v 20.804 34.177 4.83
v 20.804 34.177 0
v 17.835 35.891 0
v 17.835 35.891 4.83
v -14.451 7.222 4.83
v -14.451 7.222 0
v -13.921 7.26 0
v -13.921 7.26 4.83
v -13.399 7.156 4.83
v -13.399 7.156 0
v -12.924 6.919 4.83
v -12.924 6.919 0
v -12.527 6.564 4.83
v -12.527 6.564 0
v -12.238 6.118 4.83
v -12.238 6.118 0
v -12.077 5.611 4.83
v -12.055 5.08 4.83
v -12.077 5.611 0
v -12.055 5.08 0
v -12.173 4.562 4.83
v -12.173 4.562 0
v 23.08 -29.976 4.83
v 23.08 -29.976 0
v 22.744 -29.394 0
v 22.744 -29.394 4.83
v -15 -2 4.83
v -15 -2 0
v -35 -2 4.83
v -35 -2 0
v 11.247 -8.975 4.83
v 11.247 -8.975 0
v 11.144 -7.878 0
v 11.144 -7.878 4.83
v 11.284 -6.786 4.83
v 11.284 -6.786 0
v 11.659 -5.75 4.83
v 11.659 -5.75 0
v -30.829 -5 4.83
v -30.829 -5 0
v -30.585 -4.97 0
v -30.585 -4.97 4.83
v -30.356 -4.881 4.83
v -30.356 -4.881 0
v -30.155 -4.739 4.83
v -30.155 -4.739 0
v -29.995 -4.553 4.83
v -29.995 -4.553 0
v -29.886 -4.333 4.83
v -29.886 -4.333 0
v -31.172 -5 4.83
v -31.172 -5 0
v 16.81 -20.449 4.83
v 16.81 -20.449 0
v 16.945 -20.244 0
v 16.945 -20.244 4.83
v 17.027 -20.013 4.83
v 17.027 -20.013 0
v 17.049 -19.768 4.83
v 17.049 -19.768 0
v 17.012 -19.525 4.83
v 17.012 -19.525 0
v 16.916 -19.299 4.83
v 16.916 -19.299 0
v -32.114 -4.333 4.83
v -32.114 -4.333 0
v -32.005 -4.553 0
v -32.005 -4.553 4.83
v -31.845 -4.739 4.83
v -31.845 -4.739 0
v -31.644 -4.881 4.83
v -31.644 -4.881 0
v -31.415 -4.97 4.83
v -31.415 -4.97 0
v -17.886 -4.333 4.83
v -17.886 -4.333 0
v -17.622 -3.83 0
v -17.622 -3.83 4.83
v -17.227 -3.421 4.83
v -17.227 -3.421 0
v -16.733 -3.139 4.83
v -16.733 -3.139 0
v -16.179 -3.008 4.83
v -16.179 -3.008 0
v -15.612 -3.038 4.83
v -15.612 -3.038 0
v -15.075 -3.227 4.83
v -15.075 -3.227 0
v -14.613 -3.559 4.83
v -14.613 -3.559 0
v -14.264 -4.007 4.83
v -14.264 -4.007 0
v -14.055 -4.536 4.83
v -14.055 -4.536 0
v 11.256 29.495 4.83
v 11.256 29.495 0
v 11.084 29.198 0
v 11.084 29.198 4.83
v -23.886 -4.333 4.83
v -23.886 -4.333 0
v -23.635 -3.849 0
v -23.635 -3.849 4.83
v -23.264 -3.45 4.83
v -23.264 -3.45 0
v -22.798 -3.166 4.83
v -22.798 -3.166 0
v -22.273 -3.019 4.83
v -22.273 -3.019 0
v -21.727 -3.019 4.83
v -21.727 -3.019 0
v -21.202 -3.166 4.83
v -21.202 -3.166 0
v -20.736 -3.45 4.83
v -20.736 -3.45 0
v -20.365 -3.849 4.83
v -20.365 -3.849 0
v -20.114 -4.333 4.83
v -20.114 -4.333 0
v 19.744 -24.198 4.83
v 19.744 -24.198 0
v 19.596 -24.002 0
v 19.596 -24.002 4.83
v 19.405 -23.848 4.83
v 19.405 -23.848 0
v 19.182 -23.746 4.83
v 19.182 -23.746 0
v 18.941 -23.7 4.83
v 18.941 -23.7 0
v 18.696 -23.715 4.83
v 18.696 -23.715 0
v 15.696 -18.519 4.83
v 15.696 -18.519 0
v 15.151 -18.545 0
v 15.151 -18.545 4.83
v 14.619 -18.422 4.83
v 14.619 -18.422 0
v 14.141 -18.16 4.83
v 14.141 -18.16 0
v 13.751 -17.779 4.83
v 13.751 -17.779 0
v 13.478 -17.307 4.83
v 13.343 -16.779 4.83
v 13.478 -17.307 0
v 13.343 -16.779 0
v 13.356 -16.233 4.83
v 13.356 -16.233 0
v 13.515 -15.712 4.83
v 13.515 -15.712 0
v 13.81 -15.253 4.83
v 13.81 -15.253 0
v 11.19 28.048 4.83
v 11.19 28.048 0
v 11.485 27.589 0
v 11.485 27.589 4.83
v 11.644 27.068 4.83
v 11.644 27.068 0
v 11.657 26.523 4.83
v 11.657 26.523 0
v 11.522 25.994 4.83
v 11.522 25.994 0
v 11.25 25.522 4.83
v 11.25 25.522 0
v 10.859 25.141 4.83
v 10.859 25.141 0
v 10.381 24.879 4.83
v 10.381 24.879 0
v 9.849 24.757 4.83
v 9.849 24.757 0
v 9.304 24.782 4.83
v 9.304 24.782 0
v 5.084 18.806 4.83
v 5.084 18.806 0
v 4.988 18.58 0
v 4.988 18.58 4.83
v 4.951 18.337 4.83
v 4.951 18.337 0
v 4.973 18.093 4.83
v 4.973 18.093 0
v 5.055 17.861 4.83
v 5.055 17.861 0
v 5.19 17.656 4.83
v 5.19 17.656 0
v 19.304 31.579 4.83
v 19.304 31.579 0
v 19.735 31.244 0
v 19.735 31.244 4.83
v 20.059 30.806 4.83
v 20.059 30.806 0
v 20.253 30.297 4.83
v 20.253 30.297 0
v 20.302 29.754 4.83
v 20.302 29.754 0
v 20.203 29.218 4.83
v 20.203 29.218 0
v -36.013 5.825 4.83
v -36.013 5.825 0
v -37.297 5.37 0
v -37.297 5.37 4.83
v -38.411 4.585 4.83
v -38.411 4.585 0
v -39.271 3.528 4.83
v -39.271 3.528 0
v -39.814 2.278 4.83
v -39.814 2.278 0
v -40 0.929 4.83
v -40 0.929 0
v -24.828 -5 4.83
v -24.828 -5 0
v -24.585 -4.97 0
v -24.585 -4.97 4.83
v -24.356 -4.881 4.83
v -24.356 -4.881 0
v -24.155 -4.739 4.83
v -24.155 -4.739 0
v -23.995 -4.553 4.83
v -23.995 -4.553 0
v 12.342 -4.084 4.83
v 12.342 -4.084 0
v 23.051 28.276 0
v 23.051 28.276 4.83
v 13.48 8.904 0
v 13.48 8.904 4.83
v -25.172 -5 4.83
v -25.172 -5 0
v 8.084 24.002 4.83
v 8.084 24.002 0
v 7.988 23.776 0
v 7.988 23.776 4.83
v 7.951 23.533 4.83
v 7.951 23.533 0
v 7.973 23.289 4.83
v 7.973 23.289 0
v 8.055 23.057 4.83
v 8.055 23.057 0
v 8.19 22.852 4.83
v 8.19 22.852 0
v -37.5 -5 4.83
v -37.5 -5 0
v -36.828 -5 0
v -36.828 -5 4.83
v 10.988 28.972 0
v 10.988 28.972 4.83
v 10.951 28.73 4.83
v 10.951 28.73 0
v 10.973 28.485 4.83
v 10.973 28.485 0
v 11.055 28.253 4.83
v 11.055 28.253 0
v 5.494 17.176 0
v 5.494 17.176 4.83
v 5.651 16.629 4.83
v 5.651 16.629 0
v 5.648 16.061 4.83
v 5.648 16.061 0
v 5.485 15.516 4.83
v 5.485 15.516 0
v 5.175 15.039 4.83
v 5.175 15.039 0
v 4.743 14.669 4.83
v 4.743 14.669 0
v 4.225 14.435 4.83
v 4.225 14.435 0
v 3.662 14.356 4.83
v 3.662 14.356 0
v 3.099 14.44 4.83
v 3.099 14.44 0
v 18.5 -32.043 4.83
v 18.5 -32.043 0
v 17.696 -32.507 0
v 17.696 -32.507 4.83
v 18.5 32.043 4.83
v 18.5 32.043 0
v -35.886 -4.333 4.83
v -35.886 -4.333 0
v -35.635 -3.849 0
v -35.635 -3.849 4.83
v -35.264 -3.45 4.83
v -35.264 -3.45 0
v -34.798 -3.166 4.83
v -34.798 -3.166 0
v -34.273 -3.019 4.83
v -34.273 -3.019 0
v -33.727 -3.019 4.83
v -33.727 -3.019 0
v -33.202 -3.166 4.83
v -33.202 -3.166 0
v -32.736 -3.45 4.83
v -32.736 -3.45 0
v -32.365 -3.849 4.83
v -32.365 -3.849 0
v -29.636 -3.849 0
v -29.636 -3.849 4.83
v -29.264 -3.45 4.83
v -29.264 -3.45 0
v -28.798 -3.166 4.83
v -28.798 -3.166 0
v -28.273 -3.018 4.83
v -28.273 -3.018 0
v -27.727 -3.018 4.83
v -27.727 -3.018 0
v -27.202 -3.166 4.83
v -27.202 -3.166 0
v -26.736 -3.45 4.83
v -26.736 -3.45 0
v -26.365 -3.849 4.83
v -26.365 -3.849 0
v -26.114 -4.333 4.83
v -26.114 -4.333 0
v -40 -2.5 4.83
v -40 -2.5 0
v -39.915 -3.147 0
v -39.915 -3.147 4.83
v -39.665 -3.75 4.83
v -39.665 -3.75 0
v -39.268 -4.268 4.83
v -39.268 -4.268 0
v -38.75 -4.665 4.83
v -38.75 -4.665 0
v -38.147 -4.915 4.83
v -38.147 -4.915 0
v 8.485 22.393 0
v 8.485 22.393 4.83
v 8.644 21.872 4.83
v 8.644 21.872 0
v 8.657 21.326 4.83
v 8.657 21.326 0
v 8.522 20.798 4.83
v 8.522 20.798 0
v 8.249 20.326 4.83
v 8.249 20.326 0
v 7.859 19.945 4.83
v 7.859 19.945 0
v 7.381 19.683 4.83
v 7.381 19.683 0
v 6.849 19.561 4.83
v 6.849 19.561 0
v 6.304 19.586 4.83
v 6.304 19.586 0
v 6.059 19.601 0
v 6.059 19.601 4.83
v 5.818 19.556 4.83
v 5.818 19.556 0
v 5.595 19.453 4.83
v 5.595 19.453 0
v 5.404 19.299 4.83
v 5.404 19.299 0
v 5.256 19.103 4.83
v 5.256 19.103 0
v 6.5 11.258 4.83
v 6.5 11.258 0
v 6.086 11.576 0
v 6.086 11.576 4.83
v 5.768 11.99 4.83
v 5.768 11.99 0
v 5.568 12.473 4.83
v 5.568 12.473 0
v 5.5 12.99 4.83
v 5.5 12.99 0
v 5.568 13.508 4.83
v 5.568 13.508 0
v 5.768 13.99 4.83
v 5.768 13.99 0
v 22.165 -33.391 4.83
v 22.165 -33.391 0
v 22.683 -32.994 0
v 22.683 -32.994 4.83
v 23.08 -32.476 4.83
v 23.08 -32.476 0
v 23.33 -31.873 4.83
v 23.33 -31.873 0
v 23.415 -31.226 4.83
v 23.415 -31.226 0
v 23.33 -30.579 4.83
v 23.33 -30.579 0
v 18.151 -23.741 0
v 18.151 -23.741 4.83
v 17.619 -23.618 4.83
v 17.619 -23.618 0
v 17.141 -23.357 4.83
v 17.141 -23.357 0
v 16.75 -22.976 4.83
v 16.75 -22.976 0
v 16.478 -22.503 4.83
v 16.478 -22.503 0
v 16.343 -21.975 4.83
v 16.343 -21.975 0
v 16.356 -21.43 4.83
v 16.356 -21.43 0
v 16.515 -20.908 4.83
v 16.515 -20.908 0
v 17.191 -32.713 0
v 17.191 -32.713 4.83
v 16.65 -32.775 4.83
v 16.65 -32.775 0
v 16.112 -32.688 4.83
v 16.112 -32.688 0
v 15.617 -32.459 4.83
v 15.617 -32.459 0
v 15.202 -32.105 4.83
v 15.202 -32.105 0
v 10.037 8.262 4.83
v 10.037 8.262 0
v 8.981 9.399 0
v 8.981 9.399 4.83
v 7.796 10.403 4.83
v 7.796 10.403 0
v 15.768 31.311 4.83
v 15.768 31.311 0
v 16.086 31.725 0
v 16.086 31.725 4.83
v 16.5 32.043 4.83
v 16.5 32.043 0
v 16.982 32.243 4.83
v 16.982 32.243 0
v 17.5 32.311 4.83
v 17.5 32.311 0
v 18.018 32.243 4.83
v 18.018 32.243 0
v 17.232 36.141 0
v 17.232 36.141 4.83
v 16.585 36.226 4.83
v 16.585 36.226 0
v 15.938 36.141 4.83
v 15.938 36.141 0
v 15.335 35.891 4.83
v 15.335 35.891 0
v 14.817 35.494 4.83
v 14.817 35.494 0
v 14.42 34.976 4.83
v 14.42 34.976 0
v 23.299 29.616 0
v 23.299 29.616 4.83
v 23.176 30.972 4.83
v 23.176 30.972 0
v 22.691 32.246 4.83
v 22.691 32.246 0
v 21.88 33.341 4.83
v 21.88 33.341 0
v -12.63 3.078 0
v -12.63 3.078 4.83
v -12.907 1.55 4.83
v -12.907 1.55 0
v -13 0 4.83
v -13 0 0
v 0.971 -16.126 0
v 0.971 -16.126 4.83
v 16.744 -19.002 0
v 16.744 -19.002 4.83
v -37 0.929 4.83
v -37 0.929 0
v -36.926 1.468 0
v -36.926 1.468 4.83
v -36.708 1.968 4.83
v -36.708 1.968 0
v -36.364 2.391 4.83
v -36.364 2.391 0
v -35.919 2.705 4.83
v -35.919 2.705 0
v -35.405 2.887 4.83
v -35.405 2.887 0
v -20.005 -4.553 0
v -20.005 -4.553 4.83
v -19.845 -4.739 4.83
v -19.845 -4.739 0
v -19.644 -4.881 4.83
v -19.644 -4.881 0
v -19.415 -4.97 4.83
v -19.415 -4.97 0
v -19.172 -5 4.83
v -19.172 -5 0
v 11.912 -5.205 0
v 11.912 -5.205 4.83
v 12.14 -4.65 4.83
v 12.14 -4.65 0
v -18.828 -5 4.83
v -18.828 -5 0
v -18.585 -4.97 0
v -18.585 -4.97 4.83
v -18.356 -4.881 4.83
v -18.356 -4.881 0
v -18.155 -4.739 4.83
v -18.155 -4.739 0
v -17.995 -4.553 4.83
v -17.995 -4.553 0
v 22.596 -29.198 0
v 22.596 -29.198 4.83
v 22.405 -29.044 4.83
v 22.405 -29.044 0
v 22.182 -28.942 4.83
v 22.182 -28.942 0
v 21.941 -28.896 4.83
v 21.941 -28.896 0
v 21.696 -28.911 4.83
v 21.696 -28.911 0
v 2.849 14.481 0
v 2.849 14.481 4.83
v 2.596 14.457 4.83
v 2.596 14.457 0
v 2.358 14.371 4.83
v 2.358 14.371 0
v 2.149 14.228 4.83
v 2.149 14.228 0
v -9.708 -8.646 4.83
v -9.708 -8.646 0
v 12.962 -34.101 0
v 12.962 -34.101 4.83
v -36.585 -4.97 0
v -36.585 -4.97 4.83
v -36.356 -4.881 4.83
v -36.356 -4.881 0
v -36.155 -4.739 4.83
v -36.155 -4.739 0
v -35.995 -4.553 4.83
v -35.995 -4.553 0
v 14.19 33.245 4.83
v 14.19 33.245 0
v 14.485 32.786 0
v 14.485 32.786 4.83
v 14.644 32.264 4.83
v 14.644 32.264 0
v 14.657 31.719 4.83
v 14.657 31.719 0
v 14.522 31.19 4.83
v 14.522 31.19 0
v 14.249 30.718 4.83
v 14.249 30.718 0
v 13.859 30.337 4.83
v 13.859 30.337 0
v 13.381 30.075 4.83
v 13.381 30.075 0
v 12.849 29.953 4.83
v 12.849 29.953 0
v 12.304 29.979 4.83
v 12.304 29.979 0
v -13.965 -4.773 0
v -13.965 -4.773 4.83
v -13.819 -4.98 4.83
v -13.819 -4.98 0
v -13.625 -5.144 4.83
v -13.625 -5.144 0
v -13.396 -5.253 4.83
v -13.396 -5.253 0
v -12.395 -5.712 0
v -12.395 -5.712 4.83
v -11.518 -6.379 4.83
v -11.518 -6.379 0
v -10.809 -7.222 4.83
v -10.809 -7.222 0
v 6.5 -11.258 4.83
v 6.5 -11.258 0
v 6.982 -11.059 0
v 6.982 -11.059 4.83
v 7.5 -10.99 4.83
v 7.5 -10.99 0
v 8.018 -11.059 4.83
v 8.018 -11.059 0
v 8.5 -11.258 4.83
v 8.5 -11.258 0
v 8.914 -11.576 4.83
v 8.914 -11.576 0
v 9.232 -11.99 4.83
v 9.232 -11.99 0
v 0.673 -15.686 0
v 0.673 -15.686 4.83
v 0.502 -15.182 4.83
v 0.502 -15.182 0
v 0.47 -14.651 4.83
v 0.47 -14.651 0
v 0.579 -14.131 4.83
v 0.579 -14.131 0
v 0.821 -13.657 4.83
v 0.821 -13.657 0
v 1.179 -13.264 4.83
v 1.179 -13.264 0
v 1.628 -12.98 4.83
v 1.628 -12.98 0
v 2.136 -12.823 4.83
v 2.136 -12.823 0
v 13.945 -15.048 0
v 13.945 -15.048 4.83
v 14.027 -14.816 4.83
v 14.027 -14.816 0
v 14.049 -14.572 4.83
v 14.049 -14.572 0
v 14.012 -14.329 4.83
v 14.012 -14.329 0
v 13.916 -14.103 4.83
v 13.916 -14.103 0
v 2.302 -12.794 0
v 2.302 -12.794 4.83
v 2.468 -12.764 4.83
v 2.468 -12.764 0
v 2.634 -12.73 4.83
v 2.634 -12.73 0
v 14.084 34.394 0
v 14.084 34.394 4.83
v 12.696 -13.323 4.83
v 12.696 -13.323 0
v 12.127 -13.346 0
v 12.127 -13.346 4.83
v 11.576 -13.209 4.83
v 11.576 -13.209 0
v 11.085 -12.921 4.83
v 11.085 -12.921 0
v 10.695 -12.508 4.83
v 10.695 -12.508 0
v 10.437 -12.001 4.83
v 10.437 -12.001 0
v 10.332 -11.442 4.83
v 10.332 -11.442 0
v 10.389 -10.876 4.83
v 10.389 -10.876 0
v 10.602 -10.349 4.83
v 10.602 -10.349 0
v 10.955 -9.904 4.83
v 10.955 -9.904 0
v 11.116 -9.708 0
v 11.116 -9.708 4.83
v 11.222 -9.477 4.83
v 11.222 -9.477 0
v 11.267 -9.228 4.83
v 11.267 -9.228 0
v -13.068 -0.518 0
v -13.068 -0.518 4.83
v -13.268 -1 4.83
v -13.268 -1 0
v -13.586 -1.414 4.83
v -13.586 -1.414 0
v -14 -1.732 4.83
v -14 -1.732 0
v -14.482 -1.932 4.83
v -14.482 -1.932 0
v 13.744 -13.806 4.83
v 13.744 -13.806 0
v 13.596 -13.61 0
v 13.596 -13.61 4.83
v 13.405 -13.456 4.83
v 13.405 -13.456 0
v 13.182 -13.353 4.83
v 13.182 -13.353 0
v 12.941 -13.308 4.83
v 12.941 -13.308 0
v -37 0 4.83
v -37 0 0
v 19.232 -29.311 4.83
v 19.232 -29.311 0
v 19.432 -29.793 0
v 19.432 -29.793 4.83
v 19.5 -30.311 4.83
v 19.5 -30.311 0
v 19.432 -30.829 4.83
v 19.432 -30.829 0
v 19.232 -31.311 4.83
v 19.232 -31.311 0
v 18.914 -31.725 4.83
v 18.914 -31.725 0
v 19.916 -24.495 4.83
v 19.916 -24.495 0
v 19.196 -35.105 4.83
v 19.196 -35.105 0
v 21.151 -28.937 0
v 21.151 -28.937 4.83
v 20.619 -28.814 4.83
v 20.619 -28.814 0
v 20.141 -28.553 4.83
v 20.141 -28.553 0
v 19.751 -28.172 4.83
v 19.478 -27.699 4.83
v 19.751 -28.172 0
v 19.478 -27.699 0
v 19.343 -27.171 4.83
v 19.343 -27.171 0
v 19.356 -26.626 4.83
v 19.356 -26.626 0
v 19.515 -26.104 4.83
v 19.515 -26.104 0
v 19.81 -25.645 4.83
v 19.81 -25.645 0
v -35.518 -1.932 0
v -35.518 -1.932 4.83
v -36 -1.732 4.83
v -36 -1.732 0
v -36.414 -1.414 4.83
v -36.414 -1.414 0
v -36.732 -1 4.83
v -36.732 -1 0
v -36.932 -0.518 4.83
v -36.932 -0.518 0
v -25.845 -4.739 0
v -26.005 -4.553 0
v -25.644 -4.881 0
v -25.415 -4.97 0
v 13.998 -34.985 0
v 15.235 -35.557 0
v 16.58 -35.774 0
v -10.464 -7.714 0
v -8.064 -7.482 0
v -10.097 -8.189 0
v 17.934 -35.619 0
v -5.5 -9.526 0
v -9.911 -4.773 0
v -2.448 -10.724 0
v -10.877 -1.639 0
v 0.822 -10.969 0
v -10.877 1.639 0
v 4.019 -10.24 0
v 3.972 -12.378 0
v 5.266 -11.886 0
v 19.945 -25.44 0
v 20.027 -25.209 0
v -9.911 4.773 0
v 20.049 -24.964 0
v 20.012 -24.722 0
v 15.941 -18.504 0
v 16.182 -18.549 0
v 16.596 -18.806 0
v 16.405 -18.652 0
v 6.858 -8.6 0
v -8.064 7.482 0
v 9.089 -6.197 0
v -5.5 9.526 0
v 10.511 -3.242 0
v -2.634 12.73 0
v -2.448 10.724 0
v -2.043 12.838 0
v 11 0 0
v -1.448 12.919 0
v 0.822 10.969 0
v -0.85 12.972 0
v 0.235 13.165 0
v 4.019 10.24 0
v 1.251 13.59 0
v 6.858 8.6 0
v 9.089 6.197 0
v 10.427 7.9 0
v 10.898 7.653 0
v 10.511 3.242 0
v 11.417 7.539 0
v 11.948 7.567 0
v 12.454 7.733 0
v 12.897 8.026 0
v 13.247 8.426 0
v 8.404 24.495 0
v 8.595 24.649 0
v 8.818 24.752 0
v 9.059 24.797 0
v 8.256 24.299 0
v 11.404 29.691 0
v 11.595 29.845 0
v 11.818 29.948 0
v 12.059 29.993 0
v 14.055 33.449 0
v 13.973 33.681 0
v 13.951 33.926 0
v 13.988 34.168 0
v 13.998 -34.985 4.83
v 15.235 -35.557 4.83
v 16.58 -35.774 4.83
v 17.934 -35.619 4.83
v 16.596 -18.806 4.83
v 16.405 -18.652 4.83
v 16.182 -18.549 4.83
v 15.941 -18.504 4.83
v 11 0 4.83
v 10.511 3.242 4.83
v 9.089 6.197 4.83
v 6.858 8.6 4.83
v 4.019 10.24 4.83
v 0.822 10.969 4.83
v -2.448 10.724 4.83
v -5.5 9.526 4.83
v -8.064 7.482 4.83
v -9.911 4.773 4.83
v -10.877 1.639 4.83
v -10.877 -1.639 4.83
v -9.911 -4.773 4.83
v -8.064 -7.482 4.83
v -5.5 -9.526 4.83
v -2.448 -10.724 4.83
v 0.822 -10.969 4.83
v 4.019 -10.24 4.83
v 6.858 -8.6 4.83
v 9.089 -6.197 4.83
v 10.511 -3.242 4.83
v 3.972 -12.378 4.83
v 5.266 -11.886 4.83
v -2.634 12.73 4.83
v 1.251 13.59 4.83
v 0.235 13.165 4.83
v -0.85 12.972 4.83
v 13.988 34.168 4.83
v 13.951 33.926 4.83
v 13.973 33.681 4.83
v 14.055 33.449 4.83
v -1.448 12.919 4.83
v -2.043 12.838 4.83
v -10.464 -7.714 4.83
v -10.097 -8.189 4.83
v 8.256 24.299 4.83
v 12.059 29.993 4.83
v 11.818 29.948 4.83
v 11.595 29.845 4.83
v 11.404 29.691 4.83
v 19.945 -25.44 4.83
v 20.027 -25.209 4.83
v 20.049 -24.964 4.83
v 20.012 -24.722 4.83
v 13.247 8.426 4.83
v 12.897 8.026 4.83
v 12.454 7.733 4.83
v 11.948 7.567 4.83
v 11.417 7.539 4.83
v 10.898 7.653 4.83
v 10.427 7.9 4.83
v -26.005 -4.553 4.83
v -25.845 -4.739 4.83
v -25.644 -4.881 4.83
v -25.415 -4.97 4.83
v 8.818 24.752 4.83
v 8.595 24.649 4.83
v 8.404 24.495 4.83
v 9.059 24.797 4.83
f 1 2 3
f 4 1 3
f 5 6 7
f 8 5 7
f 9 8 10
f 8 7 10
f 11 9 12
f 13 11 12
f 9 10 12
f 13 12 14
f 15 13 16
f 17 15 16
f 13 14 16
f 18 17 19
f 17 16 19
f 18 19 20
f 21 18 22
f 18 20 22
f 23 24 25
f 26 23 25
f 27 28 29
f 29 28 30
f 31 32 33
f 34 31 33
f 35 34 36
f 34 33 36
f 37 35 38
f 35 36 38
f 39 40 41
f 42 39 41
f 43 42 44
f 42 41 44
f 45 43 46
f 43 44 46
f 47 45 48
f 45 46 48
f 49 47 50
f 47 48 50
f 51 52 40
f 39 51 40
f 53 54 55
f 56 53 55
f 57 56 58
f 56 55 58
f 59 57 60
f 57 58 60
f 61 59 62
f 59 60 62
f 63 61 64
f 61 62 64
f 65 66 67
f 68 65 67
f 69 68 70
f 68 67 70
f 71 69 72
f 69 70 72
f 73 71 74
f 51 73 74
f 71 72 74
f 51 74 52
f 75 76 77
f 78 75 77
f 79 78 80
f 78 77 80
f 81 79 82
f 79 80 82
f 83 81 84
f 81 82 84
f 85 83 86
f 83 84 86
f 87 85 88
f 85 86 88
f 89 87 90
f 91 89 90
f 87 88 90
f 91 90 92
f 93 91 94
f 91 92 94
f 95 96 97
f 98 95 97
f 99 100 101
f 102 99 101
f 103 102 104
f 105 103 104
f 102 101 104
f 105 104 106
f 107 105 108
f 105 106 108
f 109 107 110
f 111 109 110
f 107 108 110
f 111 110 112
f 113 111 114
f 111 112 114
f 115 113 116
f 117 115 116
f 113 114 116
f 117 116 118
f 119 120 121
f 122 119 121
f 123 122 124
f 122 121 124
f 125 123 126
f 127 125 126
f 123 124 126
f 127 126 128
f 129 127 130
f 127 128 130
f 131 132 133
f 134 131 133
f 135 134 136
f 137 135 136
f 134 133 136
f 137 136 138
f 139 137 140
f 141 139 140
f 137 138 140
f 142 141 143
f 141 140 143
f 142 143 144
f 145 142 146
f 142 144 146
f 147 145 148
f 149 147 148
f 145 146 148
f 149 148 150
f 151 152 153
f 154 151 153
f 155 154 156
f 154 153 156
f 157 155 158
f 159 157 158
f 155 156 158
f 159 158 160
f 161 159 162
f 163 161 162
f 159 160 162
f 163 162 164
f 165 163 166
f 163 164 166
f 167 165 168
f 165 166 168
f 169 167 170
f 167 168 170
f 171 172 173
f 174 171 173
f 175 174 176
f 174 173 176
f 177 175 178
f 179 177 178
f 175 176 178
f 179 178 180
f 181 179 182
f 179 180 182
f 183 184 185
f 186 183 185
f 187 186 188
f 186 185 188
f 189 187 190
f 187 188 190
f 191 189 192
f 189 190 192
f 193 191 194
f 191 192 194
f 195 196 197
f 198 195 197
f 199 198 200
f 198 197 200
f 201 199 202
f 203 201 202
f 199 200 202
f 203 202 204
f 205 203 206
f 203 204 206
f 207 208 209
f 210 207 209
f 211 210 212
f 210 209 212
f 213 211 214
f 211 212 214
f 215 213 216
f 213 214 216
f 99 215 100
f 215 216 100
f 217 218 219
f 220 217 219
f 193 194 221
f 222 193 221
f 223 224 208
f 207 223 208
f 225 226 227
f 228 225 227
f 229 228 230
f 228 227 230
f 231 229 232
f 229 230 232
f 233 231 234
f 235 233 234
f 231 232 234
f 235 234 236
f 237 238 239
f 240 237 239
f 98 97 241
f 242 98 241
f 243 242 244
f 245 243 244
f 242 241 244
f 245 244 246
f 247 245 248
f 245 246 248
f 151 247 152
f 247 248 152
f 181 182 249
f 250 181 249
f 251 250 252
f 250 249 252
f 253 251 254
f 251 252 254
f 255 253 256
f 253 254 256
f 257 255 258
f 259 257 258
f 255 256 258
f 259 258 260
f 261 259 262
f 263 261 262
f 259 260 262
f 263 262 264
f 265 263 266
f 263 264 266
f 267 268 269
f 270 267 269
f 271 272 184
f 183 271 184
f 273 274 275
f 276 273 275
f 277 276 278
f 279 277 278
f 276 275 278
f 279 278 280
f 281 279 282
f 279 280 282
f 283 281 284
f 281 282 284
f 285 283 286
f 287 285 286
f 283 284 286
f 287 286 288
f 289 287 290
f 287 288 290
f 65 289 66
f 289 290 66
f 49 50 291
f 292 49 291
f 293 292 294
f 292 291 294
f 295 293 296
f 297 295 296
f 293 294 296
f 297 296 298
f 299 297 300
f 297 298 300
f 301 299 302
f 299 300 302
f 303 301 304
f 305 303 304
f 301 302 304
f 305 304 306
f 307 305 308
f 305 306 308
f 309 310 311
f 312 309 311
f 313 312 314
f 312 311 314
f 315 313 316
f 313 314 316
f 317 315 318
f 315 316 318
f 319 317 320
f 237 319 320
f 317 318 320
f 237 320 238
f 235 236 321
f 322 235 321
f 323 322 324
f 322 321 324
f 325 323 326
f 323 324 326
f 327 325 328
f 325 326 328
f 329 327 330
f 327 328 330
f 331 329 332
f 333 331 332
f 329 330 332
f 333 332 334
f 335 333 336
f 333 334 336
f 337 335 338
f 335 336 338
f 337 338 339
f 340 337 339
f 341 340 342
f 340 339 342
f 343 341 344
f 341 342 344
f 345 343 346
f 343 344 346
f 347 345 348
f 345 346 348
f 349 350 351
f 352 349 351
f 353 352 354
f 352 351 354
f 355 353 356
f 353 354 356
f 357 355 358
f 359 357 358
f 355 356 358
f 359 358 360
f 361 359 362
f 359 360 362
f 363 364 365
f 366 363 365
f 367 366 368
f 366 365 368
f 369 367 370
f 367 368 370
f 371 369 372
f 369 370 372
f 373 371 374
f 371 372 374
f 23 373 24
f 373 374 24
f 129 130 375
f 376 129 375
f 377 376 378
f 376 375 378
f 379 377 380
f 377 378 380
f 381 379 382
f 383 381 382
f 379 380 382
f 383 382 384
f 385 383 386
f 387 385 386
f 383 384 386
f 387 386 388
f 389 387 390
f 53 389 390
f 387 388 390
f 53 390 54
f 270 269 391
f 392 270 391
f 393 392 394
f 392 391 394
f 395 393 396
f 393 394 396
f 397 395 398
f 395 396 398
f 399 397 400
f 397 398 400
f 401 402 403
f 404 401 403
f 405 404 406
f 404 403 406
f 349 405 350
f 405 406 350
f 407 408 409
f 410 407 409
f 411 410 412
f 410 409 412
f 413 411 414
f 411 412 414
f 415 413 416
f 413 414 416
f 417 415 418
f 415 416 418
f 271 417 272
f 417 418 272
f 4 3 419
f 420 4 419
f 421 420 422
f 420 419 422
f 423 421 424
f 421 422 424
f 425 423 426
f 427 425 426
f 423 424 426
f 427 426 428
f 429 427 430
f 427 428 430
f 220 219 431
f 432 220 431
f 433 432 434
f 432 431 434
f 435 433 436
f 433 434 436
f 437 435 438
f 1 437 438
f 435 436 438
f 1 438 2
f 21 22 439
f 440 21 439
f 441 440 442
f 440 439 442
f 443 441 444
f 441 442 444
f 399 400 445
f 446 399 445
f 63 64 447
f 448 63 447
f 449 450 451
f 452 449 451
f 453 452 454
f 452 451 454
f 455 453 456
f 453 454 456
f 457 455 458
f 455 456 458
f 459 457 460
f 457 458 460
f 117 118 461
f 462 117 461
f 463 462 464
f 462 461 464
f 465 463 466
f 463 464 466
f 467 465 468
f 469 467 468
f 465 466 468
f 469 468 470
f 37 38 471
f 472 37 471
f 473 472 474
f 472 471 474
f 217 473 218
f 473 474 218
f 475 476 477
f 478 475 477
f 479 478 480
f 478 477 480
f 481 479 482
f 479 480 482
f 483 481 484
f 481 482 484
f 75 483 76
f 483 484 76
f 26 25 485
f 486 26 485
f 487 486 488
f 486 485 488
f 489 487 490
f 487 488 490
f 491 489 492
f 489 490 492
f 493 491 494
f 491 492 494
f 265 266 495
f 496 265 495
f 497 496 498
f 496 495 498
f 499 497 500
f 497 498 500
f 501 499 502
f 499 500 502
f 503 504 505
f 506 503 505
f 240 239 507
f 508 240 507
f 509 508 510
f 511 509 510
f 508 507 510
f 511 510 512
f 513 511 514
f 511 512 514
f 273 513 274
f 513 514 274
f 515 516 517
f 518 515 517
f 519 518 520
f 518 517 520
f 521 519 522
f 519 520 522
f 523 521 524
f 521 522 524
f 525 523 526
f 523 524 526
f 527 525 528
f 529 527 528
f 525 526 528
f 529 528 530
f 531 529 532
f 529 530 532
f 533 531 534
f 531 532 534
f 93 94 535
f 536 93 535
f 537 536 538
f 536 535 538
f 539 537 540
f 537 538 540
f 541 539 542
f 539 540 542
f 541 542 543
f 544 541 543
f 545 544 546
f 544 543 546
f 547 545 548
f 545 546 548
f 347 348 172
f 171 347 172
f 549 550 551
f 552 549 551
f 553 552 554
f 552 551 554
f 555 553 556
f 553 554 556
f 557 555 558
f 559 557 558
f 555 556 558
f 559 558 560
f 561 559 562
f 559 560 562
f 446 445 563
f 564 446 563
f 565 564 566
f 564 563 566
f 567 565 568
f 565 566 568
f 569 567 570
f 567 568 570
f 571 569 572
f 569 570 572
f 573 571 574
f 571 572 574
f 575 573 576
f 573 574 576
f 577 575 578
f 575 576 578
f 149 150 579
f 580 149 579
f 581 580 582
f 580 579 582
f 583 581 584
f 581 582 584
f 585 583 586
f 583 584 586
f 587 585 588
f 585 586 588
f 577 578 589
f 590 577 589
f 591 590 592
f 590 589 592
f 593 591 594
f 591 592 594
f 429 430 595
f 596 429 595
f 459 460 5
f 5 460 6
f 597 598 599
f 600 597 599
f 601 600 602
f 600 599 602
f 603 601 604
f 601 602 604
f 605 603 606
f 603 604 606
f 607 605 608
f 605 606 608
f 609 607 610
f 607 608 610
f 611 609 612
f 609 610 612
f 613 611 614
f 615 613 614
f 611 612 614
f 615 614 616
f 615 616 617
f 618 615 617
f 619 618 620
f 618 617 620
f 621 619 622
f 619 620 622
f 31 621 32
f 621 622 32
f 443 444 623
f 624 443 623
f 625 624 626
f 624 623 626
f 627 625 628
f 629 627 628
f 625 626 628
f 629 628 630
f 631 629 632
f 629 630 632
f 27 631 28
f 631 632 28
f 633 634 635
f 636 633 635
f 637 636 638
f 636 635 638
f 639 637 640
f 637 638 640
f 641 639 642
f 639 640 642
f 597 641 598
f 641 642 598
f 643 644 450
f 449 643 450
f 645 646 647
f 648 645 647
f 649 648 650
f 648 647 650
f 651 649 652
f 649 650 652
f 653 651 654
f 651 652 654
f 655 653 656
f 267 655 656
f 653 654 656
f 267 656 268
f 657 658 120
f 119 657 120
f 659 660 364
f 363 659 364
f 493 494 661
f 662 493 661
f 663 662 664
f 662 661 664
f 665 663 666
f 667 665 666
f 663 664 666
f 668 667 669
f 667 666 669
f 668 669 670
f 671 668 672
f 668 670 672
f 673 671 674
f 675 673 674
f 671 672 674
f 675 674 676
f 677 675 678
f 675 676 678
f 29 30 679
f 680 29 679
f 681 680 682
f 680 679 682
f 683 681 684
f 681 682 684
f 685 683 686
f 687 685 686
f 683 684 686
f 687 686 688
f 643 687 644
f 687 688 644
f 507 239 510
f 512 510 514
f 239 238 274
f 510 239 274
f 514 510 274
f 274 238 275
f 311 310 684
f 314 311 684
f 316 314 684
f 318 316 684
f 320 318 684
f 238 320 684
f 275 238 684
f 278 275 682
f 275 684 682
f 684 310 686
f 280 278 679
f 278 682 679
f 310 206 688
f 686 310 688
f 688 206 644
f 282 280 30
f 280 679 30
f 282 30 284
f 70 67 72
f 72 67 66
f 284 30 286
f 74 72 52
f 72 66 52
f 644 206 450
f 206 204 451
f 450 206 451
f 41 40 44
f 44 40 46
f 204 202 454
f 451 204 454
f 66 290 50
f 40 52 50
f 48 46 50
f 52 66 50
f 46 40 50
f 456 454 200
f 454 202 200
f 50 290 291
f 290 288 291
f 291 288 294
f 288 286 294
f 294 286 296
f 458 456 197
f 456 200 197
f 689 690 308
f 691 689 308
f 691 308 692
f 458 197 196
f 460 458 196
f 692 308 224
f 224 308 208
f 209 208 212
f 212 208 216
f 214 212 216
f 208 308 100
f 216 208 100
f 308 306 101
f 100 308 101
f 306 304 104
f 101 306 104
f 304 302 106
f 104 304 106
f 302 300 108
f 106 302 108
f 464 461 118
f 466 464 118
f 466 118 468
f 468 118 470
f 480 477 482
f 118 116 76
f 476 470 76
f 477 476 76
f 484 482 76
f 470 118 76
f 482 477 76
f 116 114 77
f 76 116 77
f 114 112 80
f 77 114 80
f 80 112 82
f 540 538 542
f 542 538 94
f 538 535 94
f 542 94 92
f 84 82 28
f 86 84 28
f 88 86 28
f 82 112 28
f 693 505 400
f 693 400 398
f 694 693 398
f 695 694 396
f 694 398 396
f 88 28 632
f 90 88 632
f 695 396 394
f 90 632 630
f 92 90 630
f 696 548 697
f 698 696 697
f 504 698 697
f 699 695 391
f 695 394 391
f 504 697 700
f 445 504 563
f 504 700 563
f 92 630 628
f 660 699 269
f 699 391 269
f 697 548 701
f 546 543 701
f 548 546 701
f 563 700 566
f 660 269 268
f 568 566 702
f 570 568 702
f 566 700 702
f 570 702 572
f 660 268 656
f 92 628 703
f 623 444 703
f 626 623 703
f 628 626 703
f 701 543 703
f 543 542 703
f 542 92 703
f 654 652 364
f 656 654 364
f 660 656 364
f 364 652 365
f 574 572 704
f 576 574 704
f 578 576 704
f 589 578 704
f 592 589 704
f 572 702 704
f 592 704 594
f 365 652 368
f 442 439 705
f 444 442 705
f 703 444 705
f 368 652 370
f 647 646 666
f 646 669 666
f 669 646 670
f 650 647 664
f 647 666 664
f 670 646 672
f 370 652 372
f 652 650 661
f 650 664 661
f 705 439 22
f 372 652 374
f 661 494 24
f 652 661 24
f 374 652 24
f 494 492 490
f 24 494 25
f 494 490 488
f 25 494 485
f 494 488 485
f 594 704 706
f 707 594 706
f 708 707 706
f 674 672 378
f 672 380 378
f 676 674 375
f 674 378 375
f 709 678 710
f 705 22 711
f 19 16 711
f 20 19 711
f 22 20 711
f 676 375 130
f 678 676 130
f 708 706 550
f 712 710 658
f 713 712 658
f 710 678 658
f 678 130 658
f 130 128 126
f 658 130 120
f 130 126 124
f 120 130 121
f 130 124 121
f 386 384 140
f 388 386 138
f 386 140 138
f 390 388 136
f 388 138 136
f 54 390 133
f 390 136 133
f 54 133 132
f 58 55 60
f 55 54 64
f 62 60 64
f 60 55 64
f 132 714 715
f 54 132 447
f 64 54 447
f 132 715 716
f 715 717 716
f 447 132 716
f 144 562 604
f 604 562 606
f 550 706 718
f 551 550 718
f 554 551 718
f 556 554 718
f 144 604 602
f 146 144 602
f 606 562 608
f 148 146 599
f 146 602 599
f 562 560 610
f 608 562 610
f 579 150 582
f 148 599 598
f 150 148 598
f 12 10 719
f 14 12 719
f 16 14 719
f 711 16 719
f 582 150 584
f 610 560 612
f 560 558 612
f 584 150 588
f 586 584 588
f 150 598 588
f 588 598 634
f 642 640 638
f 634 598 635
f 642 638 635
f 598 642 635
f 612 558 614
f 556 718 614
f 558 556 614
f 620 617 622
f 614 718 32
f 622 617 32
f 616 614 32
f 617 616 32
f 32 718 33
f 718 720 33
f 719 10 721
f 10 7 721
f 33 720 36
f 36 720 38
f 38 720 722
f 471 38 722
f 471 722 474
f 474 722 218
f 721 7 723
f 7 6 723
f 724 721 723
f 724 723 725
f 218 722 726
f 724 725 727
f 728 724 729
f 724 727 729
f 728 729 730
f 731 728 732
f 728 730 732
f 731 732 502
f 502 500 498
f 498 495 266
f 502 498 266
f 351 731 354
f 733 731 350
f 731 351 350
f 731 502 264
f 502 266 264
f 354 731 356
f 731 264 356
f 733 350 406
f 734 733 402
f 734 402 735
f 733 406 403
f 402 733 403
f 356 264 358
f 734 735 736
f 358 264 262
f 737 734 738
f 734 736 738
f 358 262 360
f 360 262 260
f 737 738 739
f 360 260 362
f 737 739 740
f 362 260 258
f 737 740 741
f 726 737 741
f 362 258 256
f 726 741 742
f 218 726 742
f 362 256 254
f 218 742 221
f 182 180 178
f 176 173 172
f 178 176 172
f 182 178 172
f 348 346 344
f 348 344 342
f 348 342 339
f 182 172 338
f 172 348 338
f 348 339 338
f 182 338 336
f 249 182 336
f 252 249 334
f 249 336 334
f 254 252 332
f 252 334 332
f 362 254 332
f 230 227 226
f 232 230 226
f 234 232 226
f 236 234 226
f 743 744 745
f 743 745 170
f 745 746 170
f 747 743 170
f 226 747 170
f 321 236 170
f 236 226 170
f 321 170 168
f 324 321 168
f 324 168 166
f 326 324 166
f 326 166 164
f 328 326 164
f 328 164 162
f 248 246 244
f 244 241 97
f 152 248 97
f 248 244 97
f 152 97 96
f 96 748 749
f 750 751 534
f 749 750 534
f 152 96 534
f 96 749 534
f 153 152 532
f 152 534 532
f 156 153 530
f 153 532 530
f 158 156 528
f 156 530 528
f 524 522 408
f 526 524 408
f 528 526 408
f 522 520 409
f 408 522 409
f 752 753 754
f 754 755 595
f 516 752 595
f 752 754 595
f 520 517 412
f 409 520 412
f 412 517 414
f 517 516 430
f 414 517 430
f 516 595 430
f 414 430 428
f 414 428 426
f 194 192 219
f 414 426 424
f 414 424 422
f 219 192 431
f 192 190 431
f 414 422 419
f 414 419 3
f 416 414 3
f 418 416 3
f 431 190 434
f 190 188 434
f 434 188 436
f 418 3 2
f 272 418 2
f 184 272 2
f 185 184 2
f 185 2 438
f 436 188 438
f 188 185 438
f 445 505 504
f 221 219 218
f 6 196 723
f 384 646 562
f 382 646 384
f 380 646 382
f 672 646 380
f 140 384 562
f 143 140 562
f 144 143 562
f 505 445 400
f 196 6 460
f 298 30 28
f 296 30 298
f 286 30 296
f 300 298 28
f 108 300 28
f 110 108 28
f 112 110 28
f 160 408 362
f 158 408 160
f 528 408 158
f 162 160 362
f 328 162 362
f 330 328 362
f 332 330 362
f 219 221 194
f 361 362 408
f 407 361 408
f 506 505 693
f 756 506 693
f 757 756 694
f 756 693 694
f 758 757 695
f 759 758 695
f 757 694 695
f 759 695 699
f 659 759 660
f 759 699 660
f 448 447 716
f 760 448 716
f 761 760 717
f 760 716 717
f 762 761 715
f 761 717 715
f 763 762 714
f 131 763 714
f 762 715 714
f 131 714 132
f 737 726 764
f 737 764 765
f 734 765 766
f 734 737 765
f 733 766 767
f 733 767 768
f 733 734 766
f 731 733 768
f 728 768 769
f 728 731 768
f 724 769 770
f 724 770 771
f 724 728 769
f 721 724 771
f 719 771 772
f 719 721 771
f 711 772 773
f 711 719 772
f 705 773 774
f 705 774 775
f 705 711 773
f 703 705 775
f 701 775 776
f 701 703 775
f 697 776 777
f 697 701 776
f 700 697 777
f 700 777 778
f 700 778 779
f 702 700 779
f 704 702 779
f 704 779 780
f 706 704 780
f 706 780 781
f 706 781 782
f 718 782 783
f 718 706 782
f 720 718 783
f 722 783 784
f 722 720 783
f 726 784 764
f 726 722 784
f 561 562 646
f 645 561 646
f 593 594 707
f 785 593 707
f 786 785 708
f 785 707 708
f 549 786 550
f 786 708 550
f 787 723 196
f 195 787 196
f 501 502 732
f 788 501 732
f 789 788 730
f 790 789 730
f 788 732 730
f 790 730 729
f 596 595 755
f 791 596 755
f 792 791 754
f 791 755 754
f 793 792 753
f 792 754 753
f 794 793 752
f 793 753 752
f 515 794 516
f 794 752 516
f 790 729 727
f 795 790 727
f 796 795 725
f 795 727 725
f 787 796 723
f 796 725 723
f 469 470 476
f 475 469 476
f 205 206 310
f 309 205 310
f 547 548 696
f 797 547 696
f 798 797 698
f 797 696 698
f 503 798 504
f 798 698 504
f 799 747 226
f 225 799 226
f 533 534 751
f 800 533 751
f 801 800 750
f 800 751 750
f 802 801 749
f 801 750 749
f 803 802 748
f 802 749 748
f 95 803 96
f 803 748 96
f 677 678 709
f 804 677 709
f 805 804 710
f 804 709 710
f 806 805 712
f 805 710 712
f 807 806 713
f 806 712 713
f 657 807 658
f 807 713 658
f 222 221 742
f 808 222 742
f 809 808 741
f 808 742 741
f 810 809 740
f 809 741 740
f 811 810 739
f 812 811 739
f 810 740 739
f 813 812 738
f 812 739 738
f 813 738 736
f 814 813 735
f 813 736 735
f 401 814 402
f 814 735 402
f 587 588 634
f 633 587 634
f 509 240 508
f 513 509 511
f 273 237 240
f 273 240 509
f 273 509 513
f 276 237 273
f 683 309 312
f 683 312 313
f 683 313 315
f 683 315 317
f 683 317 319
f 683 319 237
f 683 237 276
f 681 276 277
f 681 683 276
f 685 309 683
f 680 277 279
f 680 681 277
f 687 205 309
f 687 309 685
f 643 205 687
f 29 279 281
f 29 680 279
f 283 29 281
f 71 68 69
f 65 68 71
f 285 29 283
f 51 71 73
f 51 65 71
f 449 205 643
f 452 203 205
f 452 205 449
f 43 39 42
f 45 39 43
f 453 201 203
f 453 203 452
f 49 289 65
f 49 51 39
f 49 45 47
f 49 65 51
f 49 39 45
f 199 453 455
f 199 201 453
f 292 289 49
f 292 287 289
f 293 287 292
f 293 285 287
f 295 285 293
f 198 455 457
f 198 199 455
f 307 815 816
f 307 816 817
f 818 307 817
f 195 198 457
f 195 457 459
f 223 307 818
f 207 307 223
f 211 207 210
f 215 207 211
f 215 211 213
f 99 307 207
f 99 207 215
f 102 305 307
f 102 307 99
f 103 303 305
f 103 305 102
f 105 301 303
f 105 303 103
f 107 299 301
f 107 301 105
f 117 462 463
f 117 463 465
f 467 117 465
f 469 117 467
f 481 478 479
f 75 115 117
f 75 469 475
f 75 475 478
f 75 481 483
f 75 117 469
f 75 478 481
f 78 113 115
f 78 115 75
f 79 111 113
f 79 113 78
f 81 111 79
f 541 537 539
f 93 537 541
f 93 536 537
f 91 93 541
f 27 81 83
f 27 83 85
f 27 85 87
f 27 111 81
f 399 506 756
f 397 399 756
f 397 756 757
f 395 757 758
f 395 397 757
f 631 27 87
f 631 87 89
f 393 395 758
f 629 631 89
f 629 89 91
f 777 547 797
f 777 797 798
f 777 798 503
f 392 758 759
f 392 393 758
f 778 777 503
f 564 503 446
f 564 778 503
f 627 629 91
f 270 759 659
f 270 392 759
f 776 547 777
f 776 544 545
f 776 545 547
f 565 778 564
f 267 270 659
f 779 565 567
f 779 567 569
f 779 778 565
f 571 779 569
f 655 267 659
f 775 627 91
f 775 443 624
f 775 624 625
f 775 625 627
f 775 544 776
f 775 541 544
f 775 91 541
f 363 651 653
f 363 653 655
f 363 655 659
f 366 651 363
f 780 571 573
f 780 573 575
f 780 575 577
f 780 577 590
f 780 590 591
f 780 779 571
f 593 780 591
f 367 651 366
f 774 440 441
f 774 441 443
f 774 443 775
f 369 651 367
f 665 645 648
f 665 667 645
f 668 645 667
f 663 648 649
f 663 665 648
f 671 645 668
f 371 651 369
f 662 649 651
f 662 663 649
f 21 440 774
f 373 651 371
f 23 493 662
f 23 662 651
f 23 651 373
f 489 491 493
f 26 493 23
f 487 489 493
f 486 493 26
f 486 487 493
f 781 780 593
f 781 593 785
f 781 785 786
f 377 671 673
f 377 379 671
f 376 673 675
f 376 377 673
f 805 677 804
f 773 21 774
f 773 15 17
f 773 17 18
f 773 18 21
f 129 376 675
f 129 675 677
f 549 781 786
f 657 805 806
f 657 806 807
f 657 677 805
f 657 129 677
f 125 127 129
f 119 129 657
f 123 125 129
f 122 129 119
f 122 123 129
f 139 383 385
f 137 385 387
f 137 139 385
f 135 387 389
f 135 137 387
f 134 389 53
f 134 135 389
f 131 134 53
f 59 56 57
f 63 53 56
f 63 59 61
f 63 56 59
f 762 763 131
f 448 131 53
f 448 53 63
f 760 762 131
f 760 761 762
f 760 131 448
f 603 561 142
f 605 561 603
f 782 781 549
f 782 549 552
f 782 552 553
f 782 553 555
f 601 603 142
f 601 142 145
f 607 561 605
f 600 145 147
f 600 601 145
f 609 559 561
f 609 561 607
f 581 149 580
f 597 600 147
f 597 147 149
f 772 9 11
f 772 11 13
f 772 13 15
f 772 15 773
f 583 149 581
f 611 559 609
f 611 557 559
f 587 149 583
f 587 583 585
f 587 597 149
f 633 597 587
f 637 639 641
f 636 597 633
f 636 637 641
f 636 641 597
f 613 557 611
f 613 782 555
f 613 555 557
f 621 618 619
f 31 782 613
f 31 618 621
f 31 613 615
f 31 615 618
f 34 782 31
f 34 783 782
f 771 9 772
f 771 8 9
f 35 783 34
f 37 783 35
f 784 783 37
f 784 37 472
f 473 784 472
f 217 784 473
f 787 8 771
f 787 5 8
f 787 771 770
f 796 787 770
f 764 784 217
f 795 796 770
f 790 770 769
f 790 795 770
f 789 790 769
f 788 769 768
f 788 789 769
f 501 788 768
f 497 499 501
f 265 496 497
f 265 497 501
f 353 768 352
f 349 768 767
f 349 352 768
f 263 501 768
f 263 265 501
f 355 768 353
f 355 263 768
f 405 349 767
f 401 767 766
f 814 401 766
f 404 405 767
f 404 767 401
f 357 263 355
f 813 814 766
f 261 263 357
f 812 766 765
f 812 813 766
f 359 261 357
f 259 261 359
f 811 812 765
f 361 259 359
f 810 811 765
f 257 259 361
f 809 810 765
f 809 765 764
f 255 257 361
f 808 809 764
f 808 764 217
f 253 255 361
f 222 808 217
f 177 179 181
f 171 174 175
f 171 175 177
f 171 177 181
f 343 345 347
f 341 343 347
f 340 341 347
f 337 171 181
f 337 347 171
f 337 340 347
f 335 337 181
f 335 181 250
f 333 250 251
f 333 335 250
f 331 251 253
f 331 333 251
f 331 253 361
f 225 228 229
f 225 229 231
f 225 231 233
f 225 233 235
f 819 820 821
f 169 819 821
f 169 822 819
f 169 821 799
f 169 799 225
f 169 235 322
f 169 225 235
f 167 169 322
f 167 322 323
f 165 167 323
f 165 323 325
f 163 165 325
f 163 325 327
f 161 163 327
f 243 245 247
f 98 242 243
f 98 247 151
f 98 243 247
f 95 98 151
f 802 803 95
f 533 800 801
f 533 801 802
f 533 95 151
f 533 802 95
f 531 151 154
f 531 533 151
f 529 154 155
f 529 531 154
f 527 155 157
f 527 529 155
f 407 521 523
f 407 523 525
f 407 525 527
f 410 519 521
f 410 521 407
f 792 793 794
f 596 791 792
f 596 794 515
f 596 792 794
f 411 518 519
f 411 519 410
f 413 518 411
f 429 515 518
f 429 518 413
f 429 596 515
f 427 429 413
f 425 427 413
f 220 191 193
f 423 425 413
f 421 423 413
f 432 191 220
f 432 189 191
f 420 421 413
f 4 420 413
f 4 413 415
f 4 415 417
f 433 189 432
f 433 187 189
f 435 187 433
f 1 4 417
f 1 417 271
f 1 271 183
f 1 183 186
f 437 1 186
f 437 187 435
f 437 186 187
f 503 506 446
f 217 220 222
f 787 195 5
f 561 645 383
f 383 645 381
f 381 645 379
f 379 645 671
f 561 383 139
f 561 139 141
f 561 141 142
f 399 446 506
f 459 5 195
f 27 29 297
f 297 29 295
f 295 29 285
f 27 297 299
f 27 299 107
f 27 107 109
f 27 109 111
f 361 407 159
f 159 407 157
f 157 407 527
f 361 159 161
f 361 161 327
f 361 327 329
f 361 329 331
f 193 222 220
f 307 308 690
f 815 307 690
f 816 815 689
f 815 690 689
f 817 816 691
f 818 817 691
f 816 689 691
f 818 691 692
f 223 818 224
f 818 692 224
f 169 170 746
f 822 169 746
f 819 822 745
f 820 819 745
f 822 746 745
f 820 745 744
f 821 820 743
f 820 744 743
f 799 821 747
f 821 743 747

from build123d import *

# Parameters (mm, degrees)
F0_R     = 11
F1_DEPTH = 4.83


with BuildPart() as f1:
    # F0 (on Top) → F1 (new body)
    with BuildSketch(Plane.XY):
        with BuildLine():
            ThreePointArc((-36.01296, 5.824847), (-38.877164, 4.085682), (-40, 0.928531))
            Line((-40, 0.928531), (-40, -2.5))
            ThreePointArc((-40, -2.5), (-39.267767, -4.267767), (-37.5, -5))
            Line((-37.5, -5), (-36.828427, -5))
            ThreePointArc((-36.828427, -5), (-36.251077, -4.816497), (-35.885618, -4.333333))
            ThreePointArc((-35.885618, -4.333333), (-34, -3), (-32.114382, -4.333333))
            ThreePointArc((-32.114382, -4.333333), (-31.748923, -4.816497), (-31.171573, -5))
            Line((-31.171573, -5), (-30.828573, -5))
            ThreePointArc((-30.828573, -5), (-30.251193, -4.816476), (-29.88574, -4.333265))
            ThreePointArc((-29.88574, -4.333265), (-28.000073, -2.999794), (-26.114406, -4.333265))
            ThreePointArc((-26.114406, -4.333265), (-25.748953, -4.816476), (-25.171573, -5))
            Line((-25.171573, -5), (-24.828427, -5))
            ThreePointArc((-24.828427, -5), (-24.251077, -4.816497), (-23.885618, -4.333333))
            ThreePointArc((-23.885618, -4.333333), (-22, -3), (-20.114382, -4.333333))
            ThreePointArc((-20.114382, -4.333333), (-19.748923, -4.816497), (-19.171573, -5))
            Line((-19.171573, -5), (-18.828427, -5))
            ThreePointArc((-18.828427, -5), (-18.251077, -4.816497), (-17.885618, -4.333333))
            ThreePointArc((-17.885618, -4.333333), (-15.89445, -3.002787), (-14.054617, -4.535797))
            ThreePointArc((-14.054617, -4.535797), (-13.818534, -4.980014), (-13.396043, -5.253079))
            ThreePointArc((-13.396043, -5.253079), (-11.938126, -6.021537), (-10.809232, -7.222222))
            ThreePointArc((-10.809232, -7.222222), (-10.283299, -7.953223), (-9.70802, -8.64606))
            Line((-9.70802, -8.64606), (12.962014, -34.100562))
            ThreePointArc((12.962014, -34.100562), (15.900278, -35.711453), (19.195868, -35.105282))
            Line((19.195868, -35.105282), (22.165064, -33.391016))
            ThreePointArc((22.165064, -33.391016), (23.329878, -31.873), (23.080127, -29.975953))
            Line((23.080127, -29.975953), (22.744341, -29.394353))
            ThreePointArc((22.744341, -29.394353), (22.296747, -28.986105), (21.695586, -28.91119))
            ThreePointArc((21.695586, -28.91119), (19.598076, -27.944864), (19.809968, -25.645204))
            ThreePointArc((19.809968, -25.645204), (20.04567, -25.087126), (19.915913, -24.495374))
            Line((19.915913, -24.495374), (19.744413, -24.198327))
            ThreePointArc((19.744413, -24.198327), (19.296787, -23.790064), (18.695587, -23.715177))
            ThreePointArc((18.695587, -23.715177), (16.597934, -22.748877), (16.80992, -20.449107))
            ThreePointArc((16.80992, -20.449107), (17.045667, -19.89101), (16.915913, -19.299222))
            Line((16.915913, -19.299222), (16.744341, -19.002049))
            ThreePointArc((16.744341, -19.002049), (16.296747, -18.5938), (15.695586, -18.518885))
            ThreePointArc((15.695586, -18.518885), (13.598076, -17.552559), (13.809968, -15.252899))
            ThreePointArc((13.809968, -15.252899), (14.04567, -14.694821), (13.915913, -14.103069))
            Line((13.915913, -14.103069), (13.744341, -13.805896))
            ThreePointArc((13.744341, -13.805896), (13.296747, -13.397648), (12.695586, -13.322733))
            ThreePointArc((12.695586, -13.322733), (10.547715, -12.263604), (10.955424, -9.903757))
            ThreePointArc((10.955424, -9.903757), (11.222086, -9.477195), (11.247321, -8.974774))
            ThreePointArc((11.247321, -8.974774), (11.183867, -7.327952), (11.659244, -5.749959))
            ThreePointArc((11.659244, -5.749959), (12.029343, -4.928987), (12.341717, -4.084362))
            Line((12.341717, -4.084362), (23.050946, 28.275715))
            ThreePointArc((23.050946, 28.275715), (22.976886, 31.625771), (20.804132, 34.17675))
            Line((20.804132, 34.17675), (17.834936, 35.891016))
            ThreePointArc((17.834936, 35.891016), (15.937889, 36.140767), (14.419873, 34.975953))
            Line((14.419873, 34.975953), (14.084087, 34.394353))
            ThreePointArc((14.084087, 34.394353), (13.95433, 33.802602), (14.190032, 33.244524))
            ThreePointArc((14.190032, 33.244524), (14.401924, 30.944864), (12.304414, 29.978537))
            ThreePointArc((12.304414, 29.978537), (11.703253, 29.903622), (11.255659, 29.495374))
            Line((11.255659, 29.495374), (11.084159, 29.198327))
            ThreePointArc((11.084159, 29.198327), (10.954406, 28.606539), (11.190153, 28.048442))
            ThreePointArc((11.190153, 28.048442), (11.402139, 25.748671), (9.304486, 24.782371))
            ThreePointArc((9.304486, 24.782371), (8.703286, 24.707485), (8.255659, 24.299222))
            Line((8.255659, 24.299222), (8.084087, 24.002049))
            ThreePointArc((8.084087, 24.002049), (7.95433, 23.410297), (8.190032, 22.852219))
            ThreePointArc((8.190032, 22.852219), (8.401924, 20.552559), (6.304414, 19.586232))
            ThreePointArc((6.304414, 19.586232), (5.703253, 19.511317), (5.255659, 19.103069))
            Line((5.255659, 19.103069), (5.084087, 18.805896))
            ThreePointArc((5.084087, 18.805896), (4.95433, 18.214144), (5.190032, 17.656066))
            ThreePointArc((5.190032, 17.656066), (5.346735, 15.266391), (3.099193, 14.439554))
            ThreePointArc((3.099193, 14.439554), (2.596449, 14.457209), (2.148721, 14.227853))
            ThreePointArc((2.148721, 14.227853), (0.754259, 13.349489), (-0.850012, 12.972181))
            ThreePointArc((-0.850012, 12.972181), (-1.746044, 12.88221), (-2.633697, 12.730422))
            Line((-2.633697, 12.730422), (-36.01296, 5.824847))
        make_face()
        with BuildLine():
            ThreePointArc((6.5, -11.25833), (8.017638, -11.058529), (9.232051, -11.990381))
            Line((9.232051, -11.990381), (19.232051, -29.310889))
            ThreePointArc((19.232051, -29.310889), (19.431852, -30.828527), (18.5, -32.04294))
            Line((18.5, -32.04294), (17.695868, -32.507206))
            ThreePointArc((17.695868, -32.507206), (16.377632, -32.749674), (15.202327, -32.105318))
            Line((15.202327, -32.105318), (0.971231, -16.126274))
            ThreePointArc((0.971231, -16.126274), (0.578639, -14.130903), (2.136136, -12.823296))
            ThreePointArc((2.136136, -12.823296), (2.385369, -12.779281), (2.633697, -12.730422))
            ThreePointArc((2.633697, -12.730422), (4.625783, -12.149162), (6.5, -11.25833))
        make_face(mode=Mode.SUBTRACT)
        Circle(F0_R, mode=Mode.SUBTRACT)
        with BuildLine():
            ThreePointArc((-14.451378, 7.222027), (-12.527041, 6.564336), (-12.173368, 4.5617))
            ThreePointArc((-12.173368, 4.5617), (-12.791673, 2.317996), (-13, 0))
            ThreePointArc((-13, 0), (-13.585786, -1.414214), (-15, -2))
            Line((-15, -2), (-35, -2))
            ThreePointArc((-35, -2), (-36.414214, -1.414214), (-37, 0))
            Line((-37, 0), (-37, 0.928531))
            ThreePointArc((-37, 0.928531), (-36.550866, 2.191391), (-35.405184, 2.887058))
            Line((-35.405184, 2.887058), (-14.451378, 7.222027))
        make_face(mode=Mode.SUBTRACT)
        with BuildLine():
            ThreePointArc((6.5, 11.25833), (5.568148, 12.472743), (5.767949, 13.990381))
            Line((5.767949, 13.990381), (15.767949, 31.310889))
            ThreePointArc((15.767949, 31.310889), (16.982362, 32.242741), (18.5, 32.04294))
            Line((18.5, 32.04294), (19.304132, 31.578674))
            ThreePointArc((19.304132, 31.578674), (20.173234, 30.558282), (20.202857, 29.21826))
            Line((20.202857, 29.21826), (13.480148, 8.904247))
            ThreePointArc((13.480148, 8.904247), (11.948402, 7.566568), (10.037232, 8.261596))
            ThreePointArc((10.037232, 8.261596), (8.40328, 9.918915), (6.5, 11.25833))
        make_face(mode=Mode.SUBTRACT)
    extrude(amount=F1_DEPTH)


solid = f1.part
